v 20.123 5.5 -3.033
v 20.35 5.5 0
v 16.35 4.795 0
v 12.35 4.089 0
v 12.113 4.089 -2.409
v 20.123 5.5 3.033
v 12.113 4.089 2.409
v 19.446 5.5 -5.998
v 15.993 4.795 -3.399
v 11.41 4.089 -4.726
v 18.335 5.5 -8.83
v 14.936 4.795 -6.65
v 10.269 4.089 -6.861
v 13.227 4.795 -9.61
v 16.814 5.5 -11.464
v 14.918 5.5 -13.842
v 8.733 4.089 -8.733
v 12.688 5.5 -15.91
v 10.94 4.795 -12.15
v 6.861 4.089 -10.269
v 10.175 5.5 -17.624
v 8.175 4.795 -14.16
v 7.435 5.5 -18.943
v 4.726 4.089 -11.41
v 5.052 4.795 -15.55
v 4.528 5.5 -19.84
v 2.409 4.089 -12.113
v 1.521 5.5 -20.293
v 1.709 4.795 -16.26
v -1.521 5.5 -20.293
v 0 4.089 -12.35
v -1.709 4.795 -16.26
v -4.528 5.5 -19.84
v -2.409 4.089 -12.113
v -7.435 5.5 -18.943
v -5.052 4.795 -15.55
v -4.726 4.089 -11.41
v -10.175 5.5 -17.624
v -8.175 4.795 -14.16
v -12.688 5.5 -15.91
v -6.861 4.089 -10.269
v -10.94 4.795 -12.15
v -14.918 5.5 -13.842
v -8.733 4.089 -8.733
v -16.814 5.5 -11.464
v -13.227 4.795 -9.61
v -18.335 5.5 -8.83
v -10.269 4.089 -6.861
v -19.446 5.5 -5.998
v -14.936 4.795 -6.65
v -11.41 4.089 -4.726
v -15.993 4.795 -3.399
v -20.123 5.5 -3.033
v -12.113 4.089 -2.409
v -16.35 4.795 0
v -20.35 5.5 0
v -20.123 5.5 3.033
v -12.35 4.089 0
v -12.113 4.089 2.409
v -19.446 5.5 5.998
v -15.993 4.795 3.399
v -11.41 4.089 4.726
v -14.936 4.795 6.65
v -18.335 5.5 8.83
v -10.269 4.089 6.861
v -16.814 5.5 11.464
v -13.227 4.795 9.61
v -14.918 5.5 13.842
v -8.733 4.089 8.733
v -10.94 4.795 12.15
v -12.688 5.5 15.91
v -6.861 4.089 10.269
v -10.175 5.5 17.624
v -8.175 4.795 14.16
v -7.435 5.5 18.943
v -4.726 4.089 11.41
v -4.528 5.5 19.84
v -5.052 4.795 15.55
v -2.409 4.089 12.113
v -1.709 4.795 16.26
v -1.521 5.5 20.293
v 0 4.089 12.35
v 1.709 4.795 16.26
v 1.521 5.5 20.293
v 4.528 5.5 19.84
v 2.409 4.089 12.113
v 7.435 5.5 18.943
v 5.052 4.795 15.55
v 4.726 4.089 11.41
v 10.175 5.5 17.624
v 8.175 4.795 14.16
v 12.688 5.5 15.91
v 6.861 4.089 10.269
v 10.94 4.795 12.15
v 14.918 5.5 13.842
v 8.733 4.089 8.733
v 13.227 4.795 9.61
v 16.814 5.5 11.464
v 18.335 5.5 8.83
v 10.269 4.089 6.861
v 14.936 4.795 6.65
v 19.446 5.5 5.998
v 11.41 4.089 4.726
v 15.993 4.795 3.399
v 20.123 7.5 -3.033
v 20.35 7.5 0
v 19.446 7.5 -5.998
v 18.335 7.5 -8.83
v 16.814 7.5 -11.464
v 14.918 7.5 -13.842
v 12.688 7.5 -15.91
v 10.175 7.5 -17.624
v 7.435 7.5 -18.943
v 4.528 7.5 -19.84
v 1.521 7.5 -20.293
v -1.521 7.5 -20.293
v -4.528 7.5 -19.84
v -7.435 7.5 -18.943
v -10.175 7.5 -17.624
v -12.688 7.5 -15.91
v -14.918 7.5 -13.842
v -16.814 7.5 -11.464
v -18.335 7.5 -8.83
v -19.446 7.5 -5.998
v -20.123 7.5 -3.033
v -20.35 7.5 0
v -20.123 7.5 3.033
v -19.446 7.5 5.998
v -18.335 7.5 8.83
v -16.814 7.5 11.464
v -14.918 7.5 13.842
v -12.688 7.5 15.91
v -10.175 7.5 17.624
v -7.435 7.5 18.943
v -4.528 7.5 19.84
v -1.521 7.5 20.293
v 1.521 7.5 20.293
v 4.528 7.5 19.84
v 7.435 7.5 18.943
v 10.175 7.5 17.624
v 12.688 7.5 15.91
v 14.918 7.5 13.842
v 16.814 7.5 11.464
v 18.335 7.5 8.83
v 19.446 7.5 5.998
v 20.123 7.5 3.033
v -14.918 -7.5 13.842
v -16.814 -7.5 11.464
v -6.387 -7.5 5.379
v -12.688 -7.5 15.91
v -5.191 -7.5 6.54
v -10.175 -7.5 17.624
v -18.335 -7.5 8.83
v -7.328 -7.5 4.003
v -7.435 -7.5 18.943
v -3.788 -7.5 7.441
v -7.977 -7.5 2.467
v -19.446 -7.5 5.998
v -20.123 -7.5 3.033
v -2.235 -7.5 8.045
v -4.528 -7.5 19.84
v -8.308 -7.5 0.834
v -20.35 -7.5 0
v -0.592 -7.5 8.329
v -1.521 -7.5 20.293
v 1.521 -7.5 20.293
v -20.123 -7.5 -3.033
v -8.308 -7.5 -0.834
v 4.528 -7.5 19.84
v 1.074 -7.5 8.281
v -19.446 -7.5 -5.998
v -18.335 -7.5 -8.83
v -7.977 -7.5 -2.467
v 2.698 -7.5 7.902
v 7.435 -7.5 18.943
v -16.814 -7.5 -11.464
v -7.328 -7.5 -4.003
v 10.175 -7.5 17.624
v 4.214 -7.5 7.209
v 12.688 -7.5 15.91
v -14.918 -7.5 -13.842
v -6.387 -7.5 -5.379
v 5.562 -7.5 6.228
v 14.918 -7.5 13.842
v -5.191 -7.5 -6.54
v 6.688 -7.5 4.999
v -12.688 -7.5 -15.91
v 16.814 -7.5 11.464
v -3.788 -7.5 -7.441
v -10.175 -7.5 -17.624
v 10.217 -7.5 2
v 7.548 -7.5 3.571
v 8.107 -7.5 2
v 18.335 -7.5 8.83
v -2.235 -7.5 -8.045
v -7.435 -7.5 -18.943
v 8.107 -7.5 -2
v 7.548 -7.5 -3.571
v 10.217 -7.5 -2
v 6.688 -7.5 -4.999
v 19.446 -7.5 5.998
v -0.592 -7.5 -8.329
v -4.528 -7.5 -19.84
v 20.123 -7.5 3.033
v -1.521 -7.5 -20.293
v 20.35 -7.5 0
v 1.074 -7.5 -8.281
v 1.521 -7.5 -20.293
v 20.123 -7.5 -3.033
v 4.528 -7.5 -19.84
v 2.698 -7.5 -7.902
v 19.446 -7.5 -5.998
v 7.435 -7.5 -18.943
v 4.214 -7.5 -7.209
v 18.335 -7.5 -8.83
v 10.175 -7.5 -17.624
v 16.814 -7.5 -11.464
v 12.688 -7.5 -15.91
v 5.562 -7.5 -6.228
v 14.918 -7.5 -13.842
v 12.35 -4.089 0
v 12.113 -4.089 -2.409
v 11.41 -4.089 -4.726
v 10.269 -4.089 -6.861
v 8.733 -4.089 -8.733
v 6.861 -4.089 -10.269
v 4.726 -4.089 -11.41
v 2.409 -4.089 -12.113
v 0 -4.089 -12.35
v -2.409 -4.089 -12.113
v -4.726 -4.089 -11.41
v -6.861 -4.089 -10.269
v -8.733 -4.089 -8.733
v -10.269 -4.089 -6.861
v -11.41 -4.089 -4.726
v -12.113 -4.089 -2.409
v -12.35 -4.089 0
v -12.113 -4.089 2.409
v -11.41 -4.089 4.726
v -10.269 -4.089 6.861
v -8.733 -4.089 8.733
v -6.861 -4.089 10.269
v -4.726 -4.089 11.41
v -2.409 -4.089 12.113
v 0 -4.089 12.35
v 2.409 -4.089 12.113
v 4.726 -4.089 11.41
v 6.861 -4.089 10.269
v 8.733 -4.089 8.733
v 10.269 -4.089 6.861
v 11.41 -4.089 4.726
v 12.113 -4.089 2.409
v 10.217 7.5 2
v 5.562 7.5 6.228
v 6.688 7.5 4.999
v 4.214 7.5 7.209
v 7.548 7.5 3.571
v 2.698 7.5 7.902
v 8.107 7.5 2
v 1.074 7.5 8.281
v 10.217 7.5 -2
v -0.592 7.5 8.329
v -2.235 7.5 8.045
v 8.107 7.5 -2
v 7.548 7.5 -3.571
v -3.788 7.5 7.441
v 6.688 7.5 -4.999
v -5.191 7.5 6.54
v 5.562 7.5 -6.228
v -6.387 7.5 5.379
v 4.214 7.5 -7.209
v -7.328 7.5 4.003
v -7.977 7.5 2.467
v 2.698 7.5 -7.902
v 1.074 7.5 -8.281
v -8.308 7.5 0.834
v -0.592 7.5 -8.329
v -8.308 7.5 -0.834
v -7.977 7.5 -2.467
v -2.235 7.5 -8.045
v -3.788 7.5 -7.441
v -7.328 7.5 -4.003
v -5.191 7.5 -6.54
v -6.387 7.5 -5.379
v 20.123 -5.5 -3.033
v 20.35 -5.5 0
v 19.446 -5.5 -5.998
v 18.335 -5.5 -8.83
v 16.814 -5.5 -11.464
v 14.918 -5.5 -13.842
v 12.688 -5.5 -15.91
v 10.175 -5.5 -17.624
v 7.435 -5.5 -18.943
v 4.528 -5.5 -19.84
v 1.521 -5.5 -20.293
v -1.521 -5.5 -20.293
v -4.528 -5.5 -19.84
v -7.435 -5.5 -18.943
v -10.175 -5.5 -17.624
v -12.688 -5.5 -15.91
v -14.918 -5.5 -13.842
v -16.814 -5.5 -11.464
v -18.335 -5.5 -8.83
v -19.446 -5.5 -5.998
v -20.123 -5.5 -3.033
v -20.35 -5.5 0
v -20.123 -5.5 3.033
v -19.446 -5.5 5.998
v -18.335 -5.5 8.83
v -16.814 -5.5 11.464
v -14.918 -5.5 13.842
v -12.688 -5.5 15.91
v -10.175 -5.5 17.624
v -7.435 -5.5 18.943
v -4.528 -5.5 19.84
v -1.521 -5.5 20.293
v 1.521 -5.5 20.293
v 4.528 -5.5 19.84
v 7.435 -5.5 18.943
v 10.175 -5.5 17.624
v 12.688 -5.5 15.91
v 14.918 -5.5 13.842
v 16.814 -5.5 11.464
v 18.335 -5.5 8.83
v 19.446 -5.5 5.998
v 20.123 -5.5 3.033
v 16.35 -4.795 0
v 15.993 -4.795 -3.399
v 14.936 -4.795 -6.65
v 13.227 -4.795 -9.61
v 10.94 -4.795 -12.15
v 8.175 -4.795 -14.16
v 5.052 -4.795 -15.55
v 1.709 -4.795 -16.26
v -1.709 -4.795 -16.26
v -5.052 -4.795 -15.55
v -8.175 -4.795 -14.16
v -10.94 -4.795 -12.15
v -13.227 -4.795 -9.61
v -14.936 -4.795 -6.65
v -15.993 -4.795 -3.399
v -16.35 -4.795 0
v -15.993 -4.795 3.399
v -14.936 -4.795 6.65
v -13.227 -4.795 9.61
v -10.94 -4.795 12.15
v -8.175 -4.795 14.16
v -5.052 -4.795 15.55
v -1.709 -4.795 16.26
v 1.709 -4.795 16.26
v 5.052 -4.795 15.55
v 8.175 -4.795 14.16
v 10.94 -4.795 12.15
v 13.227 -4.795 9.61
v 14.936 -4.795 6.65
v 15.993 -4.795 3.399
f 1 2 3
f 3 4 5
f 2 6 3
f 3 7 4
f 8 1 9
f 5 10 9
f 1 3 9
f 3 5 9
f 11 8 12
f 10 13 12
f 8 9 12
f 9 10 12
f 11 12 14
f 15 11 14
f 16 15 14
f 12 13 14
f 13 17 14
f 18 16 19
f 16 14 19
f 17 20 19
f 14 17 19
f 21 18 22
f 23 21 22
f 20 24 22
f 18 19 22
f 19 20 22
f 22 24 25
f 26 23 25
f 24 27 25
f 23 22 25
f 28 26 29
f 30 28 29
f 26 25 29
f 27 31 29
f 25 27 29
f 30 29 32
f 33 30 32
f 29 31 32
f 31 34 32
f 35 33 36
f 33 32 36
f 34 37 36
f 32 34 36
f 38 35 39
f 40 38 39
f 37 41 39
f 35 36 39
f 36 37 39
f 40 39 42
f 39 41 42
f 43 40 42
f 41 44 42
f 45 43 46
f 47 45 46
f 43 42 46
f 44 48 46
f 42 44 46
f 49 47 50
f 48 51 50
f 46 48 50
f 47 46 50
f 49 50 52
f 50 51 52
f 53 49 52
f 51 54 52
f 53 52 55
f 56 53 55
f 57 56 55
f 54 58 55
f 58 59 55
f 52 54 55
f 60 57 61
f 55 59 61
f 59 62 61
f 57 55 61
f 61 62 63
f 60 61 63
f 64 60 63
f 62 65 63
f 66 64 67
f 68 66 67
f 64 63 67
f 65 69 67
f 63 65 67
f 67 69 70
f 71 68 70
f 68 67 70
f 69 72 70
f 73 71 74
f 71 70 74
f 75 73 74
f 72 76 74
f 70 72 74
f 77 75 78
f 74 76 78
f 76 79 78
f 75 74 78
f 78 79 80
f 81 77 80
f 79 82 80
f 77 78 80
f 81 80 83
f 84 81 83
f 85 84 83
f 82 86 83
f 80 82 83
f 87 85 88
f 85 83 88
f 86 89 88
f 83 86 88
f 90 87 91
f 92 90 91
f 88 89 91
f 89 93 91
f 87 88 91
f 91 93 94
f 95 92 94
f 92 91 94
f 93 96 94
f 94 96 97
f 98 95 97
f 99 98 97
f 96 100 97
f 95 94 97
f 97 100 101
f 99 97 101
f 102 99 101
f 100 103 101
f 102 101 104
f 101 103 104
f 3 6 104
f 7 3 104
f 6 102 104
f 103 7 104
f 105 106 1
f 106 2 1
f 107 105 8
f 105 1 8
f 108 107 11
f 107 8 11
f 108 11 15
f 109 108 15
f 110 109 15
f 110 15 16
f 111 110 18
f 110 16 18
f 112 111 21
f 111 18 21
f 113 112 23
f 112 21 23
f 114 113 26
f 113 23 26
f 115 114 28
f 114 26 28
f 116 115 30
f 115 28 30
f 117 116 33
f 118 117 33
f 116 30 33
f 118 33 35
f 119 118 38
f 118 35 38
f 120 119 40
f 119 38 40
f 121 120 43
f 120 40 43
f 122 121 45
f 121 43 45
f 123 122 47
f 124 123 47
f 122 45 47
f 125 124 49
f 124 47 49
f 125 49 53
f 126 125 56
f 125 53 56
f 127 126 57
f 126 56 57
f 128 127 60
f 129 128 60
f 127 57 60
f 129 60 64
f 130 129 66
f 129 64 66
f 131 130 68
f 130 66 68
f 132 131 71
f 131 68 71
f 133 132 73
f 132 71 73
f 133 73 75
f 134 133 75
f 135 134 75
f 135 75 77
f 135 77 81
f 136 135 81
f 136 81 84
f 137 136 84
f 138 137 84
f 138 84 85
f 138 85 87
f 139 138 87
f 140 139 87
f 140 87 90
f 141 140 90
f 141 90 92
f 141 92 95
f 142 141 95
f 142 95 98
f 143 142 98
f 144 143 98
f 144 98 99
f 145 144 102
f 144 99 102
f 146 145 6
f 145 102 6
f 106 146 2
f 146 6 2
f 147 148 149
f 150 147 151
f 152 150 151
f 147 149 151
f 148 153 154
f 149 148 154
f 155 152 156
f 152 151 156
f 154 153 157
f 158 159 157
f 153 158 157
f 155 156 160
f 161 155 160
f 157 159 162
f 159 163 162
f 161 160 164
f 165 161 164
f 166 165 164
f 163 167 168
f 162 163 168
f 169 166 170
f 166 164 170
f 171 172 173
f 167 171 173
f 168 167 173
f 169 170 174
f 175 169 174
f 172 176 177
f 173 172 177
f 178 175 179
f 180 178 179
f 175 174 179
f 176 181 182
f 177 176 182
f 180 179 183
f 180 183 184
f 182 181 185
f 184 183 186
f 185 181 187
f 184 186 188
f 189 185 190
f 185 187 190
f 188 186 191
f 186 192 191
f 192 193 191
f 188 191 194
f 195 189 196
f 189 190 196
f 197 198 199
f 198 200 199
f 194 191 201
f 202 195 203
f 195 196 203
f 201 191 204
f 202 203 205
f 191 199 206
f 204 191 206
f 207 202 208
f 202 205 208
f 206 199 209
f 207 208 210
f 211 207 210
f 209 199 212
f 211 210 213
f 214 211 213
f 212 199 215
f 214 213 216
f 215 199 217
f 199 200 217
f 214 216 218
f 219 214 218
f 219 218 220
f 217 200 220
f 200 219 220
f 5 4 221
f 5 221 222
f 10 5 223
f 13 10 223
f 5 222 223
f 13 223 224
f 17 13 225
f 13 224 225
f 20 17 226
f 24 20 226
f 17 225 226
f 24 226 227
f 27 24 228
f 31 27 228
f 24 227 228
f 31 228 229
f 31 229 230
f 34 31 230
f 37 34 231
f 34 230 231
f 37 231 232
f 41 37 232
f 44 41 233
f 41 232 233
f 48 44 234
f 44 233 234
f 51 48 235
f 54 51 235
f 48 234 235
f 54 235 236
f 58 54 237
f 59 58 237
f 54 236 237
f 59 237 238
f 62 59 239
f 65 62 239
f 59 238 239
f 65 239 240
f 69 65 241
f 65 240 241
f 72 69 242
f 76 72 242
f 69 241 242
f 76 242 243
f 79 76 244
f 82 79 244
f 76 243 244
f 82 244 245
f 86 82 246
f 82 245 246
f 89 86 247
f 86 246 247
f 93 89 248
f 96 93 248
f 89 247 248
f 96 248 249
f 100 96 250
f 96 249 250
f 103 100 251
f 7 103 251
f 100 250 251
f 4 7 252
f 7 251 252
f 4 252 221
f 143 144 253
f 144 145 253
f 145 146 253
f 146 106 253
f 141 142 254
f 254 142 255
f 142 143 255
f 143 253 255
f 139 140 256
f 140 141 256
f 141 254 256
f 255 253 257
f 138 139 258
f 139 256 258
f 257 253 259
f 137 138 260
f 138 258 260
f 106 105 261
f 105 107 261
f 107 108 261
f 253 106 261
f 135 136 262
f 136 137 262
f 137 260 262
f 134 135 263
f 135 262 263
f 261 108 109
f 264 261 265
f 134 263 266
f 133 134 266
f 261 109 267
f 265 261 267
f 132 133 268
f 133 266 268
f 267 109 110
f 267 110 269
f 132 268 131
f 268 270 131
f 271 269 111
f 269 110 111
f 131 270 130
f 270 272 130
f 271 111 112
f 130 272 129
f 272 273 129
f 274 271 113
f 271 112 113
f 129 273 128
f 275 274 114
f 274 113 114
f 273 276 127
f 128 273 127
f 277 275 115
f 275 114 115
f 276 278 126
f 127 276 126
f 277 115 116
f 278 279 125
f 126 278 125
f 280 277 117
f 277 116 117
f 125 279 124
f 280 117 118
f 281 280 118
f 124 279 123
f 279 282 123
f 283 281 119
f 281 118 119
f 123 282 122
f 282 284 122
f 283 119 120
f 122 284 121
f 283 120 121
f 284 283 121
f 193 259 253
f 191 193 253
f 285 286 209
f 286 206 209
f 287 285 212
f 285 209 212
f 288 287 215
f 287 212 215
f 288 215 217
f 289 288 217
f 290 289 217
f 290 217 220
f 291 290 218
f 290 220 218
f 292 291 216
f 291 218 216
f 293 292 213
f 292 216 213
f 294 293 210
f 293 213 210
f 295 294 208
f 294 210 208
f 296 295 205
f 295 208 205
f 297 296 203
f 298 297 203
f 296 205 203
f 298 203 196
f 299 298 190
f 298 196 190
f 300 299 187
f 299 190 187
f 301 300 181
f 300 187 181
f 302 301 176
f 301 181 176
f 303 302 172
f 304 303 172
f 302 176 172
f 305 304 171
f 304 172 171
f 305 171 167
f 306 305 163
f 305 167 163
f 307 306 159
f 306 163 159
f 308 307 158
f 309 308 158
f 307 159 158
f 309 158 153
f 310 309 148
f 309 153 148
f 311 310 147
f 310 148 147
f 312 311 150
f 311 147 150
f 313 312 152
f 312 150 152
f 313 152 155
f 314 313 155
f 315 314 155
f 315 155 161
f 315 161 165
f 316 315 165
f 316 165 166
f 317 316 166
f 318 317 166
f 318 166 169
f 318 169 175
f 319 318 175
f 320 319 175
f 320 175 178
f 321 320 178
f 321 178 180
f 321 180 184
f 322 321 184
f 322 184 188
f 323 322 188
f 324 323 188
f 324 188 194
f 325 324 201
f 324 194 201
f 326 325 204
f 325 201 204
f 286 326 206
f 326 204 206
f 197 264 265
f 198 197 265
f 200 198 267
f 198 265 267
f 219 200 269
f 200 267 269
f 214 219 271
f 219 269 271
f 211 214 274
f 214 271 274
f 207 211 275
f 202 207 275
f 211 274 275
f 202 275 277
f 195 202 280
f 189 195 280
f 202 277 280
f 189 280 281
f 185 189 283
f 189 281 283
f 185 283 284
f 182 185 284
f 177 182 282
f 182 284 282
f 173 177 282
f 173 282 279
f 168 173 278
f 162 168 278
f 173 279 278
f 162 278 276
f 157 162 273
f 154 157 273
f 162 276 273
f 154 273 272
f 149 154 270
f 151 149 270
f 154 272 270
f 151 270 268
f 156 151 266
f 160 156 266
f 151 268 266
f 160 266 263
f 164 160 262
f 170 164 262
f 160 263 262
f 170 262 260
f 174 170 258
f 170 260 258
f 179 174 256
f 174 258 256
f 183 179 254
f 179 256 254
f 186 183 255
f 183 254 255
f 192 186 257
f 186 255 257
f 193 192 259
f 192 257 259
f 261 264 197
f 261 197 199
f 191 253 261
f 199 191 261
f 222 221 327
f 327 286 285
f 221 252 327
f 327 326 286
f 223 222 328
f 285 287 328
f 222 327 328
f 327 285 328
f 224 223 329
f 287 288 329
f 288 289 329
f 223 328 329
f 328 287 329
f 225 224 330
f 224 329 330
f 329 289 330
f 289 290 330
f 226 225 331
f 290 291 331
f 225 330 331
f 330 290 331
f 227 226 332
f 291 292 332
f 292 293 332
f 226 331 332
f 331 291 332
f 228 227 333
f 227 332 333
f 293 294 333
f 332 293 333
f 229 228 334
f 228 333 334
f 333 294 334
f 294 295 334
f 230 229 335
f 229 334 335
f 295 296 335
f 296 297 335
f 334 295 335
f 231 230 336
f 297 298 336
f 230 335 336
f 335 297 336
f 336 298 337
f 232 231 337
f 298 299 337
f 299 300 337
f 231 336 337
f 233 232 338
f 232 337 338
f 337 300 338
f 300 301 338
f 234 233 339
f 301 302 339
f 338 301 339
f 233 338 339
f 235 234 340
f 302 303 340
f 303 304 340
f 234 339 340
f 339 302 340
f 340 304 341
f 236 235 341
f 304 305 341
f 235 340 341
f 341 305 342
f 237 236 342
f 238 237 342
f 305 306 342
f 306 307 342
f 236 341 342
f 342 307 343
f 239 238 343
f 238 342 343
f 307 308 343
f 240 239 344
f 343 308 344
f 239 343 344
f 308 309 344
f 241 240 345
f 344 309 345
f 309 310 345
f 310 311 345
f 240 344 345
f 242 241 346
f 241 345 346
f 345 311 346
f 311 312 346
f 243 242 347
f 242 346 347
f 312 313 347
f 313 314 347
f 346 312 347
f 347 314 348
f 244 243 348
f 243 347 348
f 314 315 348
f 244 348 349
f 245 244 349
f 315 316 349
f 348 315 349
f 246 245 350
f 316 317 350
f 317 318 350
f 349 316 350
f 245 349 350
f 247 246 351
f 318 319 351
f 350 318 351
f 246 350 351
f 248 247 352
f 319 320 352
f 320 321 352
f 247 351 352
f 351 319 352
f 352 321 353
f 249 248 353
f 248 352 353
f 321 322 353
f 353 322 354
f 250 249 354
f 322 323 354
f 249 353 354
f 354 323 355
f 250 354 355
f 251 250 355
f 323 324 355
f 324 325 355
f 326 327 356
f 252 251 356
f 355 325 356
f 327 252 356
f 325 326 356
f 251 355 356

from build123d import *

# Parameters (mm, degrees)
SKETCH2_W          = 10.216941
SKETCH2_H          = 4
CUT_EXTRUDE1_DEPTH = 15


with BuildPart() as part:
    # Sketch1 → Revolve1 (revolve)
    with BuildSketch(Plane.XY):
        Polygon((20.35, 5.5), (12.35, 4.089384154), (12.35, -4.089384154), (20.35, -5.5), (20.35, -7.5), (8.35, -7.5), (8.35, 7.5), (20.35, 7.5), align=None)
    revolve(axis=Axis((0, -1000, 0), (0, 1, 0)))

    # Sketch2 → Cut-Extrude1 (cut)
    with BuildSketch(Plane(origin=(0, 7.5, 0), x_dir=(1, 0, 0), z_dir=(0, 1, 0))):
        with Locations((5.1084705, 0)):
            Rectangle(SKETCH2_W, SKETCH2_H)
    extrude(amount=-CUT_EXTRUDE1_DEPTH, mode=Mode.SUBTRACT)


solid = part.part
